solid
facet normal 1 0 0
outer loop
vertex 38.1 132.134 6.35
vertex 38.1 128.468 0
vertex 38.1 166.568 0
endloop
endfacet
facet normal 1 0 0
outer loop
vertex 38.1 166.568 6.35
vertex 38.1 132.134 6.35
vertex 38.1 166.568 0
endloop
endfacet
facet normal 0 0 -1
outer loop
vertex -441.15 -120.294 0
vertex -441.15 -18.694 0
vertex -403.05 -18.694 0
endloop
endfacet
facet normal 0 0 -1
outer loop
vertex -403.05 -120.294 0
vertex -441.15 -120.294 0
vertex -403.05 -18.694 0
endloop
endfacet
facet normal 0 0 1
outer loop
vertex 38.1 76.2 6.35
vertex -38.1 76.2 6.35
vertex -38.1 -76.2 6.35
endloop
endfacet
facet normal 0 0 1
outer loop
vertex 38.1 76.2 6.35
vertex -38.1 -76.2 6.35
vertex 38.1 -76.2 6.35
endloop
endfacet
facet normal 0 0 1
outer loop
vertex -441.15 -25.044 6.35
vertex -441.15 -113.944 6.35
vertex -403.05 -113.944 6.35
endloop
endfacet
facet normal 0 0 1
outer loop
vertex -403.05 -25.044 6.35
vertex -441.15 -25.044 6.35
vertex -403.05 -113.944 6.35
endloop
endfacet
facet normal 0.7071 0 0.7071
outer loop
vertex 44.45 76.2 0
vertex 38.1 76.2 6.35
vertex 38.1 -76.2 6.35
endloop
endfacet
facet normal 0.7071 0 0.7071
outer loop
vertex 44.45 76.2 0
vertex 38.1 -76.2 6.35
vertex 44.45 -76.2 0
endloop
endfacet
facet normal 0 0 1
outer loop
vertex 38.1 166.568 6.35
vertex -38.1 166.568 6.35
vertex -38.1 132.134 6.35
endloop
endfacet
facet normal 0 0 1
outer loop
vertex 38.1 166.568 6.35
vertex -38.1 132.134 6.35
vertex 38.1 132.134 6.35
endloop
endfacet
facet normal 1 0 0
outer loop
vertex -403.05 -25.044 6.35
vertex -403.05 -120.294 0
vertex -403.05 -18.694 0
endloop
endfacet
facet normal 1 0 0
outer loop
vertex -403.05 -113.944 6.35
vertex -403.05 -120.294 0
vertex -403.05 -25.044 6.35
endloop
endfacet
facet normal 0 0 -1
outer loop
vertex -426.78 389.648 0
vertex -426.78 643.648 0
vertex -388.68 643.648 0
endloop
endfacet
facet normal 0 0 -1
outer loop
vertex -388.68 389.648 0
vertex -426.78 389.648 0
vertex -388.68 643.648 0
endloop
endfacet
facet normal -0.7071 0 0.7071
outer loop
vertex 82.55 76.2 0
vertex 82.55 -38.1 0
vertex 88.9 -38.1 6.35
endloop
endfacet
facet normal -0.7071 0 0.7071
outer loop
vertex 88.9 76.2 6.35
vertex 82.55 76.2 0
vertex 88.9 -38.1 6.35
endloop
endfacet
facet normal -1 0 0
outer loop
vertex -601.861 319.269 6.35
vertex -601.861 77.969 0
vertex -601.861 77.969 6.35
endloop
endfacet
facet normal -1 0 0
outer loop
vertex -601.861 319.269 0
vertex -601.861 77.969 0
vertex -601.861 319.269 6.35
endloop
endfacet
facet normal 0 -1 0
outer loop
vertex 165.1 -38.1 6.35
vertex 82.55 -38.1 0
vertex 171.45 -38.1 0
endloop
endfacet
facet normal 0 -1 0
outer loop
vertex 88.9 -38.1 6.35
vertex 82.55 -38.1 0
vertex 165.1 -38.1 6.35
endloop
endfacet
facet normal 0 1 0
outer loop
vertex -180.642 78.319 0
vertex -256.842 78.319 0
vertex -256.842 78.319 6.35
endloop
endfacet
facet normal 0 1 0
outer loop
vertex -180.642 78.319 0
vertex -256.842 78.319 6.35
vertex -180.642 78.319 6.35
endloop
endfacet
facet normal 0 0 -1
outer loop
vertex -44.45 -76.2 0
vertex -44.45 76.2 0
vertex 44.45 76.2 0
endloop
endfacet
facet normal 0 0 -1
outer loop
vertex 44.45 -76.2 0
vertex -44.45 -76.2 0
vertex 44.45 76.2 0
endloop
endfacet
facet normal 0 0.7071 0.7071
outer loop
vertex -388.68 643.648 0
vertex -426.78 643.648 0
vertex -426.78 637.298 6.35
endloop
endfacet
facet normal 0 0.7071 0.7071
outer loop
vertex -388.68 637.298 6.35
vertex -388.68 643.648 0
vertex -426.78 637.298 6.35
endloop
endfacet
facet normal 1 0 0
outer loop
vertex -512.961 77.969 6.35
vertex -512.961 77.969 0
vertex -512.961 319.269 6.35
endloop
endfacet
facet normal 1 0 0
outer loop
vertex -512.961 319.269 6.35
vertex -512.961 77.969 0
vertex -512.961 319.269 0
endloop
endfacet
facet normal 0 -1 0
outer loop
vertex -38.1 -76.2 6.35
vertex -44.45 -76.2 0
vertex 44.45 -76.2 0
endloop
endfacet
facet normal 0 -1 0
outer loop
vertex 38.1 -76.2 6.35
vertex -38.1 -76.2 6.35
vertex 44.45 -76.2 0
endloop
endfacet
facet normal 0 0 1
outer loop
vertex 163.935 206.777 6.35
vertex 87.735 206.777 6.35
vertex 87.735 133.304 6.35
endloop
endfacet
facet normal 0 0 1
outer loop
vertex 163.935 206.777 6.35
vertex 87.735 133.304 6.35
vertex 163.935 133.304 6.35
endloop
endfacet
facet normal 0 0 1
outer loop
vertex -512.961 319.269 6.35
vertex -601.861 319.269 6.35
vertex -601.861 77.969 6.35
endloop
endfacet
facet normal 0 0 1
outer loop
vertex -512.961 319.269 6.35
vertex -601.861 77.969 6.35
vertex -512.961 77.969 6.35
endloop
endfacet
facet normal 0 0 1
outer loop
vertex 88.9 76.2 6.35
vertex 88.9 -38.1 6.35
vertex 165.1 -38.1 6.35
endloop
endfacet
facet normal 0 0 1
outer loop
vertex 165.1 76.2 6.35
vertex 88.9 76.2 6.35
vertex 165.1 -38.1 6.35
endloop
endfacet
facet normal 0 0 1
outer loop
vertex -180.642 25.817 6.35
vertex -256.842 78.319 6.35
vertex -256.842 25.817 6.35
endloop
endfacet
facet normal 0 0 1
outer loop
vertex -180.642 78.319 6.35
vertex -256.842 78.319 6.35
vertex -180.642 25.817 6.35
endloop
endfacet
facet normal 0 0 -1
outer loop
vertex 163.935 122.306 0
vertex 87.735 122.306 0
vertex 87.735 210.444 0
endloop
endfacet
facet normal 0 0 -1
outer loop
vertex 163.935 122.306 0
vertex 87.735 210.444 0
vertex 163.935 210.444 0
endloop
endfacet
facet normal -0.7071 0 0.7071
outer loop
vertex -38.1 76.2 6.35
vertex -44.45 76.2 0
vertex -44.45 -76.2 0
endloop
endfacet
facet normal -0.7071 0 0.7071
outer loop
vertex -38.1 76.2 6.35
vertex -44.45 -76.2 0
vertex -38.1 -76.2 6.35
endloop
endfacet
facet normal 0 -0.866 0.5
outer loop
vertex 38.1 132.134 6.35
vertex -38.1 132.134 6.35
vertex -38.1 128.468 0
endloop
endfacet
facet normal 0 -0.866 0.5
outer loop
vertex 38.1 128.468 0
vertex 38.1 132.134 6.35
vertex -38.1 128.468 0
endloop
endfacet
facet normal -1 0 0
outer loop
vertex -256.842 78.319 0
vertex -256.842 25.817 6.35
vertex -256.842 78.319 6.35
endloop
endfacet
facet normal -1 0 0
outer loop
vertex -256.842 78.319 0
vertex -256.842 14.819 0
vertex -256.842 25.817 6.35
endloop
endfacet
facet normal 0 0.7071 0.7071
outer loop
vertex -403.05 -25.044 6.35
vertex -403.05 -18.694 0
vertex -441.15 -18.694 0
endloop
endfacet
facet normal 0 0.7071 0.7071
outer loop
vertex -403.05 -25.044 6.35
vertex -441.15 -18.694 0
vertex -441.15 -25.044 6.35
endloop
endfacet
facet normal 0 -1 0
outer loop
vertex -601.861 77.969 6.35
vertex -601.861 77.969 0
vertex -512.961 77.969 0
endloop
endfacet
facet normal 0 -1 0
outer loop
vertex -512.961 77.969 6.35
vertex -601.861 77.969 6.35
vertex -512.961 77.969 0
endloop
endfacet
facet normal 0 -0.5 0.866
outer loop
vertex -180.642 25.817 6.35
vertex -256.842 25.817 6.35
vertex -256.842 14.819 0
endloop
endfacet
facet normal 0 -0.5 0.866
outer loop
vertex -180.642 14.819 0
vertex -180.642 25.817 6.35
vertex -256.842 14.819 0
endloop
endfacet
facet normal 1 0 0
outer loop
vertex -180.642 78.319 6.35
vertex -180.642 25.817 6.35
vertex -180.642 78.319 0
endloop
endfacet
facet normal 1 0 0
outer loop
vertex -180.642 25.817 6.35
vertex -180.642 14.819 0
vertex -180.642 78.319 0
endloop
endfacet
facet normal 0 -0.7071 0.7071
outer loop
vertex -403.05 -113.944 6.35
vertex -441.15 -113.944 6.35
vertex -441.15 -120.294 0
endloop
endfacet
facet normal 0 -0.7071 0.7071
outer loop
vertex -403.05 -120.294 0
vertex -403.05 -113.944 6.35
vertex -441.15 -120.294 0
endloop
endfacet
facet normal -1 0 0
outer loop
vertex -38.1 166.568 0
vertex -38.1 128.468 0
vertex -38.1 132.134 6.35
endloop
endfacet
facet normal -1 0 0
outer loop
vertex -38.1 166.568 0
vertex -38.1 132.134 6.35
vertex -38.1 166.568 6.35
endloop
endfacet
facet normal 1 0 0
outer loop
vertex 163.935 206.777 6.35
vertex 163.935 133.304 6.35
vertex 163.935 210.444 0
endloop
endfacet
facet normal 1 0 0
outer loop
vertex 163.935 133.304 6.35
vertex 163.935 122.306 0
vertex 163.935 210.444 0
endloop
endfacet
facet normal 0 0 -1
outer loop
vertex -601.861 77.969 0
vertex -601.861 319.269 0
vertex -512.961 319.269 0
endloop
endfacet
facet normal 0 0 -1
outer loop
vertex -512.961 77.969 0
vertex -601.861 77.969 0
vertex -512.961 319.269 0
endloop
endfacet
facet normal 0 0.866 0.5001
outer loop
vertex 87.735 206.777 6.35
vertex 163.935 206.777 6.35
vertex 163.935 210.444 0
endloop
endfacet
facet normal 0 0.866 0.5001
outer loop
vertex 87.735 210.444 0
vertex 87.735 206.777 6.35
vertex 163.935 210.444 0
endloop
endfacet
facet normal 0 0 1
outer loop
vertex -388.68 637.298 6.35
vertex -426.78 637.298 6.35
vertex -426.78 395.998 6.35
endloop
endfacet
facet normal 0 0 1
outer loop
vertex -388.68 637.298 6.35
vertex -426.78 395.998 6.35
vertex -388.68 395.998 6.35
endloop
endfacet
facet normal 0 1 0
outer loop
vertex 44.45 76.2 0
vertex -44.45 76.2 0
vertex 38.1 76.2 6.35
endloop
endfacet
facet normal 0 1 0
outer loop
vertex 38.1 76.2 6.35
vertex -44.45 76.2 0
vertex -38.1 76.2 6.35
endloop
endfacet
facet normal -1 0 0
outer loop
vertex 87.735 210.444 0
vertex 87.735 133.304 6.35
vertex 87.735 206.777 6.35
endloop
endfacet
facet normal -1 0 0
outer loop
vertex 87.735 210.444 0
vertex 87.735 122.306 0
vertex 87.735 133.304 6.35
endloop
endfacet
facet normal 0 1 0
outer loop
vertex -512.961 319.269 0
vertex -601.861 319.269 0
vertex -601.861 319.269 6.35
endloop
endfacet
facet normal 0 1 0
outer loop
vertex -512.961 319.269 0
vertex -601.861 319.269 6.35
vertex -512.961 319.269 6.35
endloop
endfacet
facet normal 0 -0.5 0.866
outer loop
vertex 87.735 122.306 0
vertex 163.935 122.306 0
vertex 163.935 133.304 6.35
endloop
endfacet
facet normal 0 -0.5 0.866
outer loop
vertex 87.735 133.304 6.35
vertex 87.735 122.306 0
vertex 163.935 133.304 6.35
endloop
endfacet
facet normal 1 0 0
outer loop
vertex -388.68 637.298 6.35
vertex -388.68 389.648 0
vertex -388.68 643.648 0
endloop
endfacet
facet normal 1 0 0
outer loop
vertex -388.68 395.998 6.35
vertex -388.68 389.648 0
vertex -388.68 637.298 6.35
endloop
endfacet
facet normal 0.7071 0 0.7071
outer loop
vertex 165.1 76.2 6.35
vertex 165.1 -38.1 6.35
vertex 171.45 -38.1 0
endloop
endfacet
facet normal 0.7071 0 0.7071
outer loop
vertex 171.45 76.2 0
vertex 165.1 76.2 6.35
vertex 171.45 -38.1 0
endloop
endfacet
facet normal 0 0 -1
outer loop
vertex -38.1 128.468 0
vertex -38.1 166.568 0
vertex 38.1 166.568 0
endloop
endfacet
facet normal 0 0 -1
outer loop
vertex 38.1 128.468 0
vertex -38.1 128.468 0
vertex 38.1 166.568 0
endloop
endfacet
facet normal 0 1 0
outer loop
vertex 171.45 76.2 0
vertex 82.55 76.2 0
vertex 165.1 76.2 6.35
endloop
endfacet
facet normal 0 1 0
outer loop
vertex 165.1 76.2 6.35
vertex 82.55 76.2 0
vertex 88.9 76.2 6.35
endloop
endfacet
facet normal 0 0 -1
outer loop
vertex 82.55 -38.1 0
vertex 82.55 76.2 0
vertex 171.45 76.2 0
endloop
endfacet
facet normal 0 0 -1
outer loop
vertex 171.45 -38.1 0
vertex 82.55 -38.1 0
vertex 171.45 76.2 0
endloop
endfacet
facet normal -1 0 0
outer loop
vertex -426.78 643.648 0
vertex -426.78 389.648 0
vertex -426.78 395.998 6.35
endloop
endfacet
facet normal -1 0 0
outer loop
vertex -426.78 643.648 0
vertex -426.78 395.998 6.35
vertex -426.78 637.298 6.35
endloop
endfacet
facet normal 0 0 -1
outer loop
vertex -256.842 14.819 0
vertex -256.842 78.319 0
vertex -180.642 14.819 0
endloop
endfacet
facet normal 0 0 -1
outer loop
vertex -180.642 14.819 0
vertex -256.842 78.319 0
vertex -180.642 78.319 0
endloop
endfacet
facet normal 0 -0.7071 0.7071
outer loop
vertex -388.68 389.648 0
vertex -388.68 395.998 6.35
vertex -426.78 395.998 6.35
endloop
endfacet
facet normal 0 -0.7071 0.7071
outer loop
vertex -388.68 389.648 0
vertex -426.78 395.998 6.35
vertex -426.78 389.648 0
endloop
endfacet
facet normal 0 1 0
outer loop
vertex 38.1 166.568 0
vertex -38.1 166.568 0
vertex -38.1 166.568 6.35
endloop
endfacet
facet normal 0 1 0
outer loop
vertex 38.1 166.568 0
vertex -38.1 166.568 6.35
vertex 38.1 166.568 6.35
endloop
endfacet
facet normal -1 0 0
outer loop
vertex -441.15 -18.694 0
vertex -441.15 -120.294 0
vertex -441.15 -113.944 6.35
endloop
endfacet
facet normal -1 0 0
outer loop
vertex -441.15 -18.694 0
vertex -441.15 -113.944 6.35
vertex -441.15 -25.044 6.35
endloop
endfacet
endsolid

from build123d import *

# Parameters (mm, degrees)
F0_W      = 88.9
F0_H      = 152.4
F1_DEPTH  = 6.35
F3_DEPTH  = 152.401
F4_W      = 76.2
F4_H      = 38.1
F5_DEPTH  = 6.35
F7_DEPTH  = 82.551
F9_W      = 76.2
F9_H      = 88.138
F10_DEPTH = 6.35
F12_DEPTH = 208.3857549435
F13_W     = 88.9
F13_H     = 38.1
F14_DEPTH = 6.351
F15_W     = 76.2
F15_H     = 63.5
F16_DEPTH = 6.35
F18_DEPTH = 428.2933748732
F19_W     = 88.9
F19_H     = 241.3
F20_DEPTH = 6.35
F21_W     = 38.1
F21_H     = 254
F22_DEPTH = 6.35
F24_DEPTH = 598.2312217484
F25_W     = 38.1
F25_H     = 101.6
F26_DEPTH = 6.35
F28_DEPTH = 612.6011565456


with BuildPart() as f1:
    # F0 (on Top) → F1 (new body)
    with BuildSketch(Plane.XY):
        Rectangle(F0_W, F0_H)
    extrude(amount=F1_DEPTH)

    # F2 (on face) → F3 (cut, through all)
    with BuildSketch(Plane.XZ.offset(76.2)):
        Polygon((44.45, 0), (44.45, 6.35), (38.1, 6.35), align=None)
        Polygon((-38.1, 6.35), (-44.45, 6.35), (-44.45, 0), align=None)
    extrude(amount=-F3_DEPTH, mode=Mode.SUBTRACT)


with BuildPart() as f5:
    # F4 (on Top) → F5 (new body)
    with BuildSketch(Plane.XY):
        with Locations((0, 147.5176820167)):
            Rectangle(F4_W, F4_H)
    extrude(amount=F5_DEPTH)

    # F6 (on face) → F7 (cut, through all)
    with BuildSketch(Plane(origin=(-38.1, 0, 0), x_dir=(0, -1, 0), z_dir=(-1, 0, 0))):
        Polygon((-132.133856226, 6.35), (-128.4676820167, 0), (-128.4676820167, 6.35), align=None)
    extrude(amount=-F7_DEPTH, mode=Mode.SUBTRACT)


with BuildPart() as f8_1:
    # F8: copy of F1
    add(f1.part.moved(Location((127, 0, 0))))

    # F13 (on face) → F14 (cut, through all)
    with BuildSketch(Plane(origin=(0, 0, 0), x_dir=(1, 0, 0), z_dir=(0, 0, -1))):
        with Locations((127, 57.15)):
            Rectangle(F13_W, F13_H)
    extrude(amount=-F14_DEPTH, mode=Mode.SUBTRACT)


with BuildPart() as f10:
    # F9 (on Top) → F10 (new body)
    with BuildSketch(Plane.XY):
        with Locations((125.8347549435, 166.3745697414)):
            Rectangle(F9_W, F9_H)
    extrude(amount=F10_DEPTH)

    # F11 (on face) → F12 (cut, through all)
    with BuildSketch(Plane.YZ.offset(163.9347549435)):
        Polygon((122.3055697414, 6.35), (122.3055697414, 0), (133.3040923695, 6.35), align=None)
        Polygon((206.7773955321, 6.35), (210.4435697414, 0), (210.4435697414, 6.35), align=None)
    extrude(amount=-F12_DEPTH, mode=Mode.SUBTRACT)


with BuildPart() as f16:
    # F15 (on Top) → F16 (new body)
    with BuildSketch(Plane.XY):
        with Locations((-218.7423748732, 46.5687926128)):
            Rectangle(F15_W, F15_H)
    extrude(amount=F16_DEPTH)

    # F17 (on face) → F18 (cut, through all)
    with BuildSketch(Plane(origin=(-256.8423748732, 0, 0), x_dir=(0, -1, 0), z_dir=(-1, 0, 0))):
        Polygon((-25.8173152409, 6.35), (-14.8187926128, 0), (-14.8187926128, 6.35), align=None)
    extrude(amount=-F18_DEPTH, mode=Mode.SUBTRACT)


with BuildPart() as f20:
    # F19 (on Top) → F20 (new body)
    with BuildSketch(Plane.XY):
        with Locations((-557.4112534523, 198.6187406094)):
            Rectangle(F19_W, F19_H)
    extrude(amount=F20_DEPTH)


with BuildPart() as f22:
    # F21 (on Top) → F22 (new body)
    with BuildSketch(Plane.XY):
        with Locations((-407.7302217484, 516.6475176811)):
            Rectangle(F21_W, F21_H)
    extrude(amount=F22_DEPTH)

    # F23 (on face) → F24 (cut, through all)
    with BuildSketch(Plane(origin=(-426.7802217484, 0, 0), x_dir=(0, -1, 0), z_dir=(-1, 0, 0))):
        Polygon((-643.6475176811, 6.35), (-643.6475176811, 0), (-637.2975176811, 6.35), align=None)
        Polygon((-395.9975176811, 6.35), (-389.6475176811, 0), (-389.6475176811, 6.35), align=None)
    extrude(amount=-F24_DEPTH, mode=Mode.SUBTRACT)


with BuildPart() as f26:
    # F25 (on Top) → F26 (new body)
    with BuildSketch(Plane.XY):
        with Locations((-422.1001565456, -69.4943308092)):
            Rectangle(F25_W, F25_H)
    extrude(amount=F26_DEPTH)

    # F27 (on face) → F28 (cut, through all)
    with BuildSketch(Plane(origin=(-441.1501565456, 0, 0), x_dir=(0, -1, 0), z_dir=(-1, 0, 0))):
        Polygon((18.6943308092, 6.35), (18.6943308092, 0), (25.0443308092, 6.35), align=None)
        Polygon((113.9443308092, 6.35), (120.2943308092, 0), (120.2943308092, 6.35), align=None)
    extrude(amount=-F28_DEPTH, mode=Mode.SUBTRACT)


solid = Compound([f1.part, f5.part, f8_1.part, f10.part, f16.part, f20.part, f22.part, f26.part])
